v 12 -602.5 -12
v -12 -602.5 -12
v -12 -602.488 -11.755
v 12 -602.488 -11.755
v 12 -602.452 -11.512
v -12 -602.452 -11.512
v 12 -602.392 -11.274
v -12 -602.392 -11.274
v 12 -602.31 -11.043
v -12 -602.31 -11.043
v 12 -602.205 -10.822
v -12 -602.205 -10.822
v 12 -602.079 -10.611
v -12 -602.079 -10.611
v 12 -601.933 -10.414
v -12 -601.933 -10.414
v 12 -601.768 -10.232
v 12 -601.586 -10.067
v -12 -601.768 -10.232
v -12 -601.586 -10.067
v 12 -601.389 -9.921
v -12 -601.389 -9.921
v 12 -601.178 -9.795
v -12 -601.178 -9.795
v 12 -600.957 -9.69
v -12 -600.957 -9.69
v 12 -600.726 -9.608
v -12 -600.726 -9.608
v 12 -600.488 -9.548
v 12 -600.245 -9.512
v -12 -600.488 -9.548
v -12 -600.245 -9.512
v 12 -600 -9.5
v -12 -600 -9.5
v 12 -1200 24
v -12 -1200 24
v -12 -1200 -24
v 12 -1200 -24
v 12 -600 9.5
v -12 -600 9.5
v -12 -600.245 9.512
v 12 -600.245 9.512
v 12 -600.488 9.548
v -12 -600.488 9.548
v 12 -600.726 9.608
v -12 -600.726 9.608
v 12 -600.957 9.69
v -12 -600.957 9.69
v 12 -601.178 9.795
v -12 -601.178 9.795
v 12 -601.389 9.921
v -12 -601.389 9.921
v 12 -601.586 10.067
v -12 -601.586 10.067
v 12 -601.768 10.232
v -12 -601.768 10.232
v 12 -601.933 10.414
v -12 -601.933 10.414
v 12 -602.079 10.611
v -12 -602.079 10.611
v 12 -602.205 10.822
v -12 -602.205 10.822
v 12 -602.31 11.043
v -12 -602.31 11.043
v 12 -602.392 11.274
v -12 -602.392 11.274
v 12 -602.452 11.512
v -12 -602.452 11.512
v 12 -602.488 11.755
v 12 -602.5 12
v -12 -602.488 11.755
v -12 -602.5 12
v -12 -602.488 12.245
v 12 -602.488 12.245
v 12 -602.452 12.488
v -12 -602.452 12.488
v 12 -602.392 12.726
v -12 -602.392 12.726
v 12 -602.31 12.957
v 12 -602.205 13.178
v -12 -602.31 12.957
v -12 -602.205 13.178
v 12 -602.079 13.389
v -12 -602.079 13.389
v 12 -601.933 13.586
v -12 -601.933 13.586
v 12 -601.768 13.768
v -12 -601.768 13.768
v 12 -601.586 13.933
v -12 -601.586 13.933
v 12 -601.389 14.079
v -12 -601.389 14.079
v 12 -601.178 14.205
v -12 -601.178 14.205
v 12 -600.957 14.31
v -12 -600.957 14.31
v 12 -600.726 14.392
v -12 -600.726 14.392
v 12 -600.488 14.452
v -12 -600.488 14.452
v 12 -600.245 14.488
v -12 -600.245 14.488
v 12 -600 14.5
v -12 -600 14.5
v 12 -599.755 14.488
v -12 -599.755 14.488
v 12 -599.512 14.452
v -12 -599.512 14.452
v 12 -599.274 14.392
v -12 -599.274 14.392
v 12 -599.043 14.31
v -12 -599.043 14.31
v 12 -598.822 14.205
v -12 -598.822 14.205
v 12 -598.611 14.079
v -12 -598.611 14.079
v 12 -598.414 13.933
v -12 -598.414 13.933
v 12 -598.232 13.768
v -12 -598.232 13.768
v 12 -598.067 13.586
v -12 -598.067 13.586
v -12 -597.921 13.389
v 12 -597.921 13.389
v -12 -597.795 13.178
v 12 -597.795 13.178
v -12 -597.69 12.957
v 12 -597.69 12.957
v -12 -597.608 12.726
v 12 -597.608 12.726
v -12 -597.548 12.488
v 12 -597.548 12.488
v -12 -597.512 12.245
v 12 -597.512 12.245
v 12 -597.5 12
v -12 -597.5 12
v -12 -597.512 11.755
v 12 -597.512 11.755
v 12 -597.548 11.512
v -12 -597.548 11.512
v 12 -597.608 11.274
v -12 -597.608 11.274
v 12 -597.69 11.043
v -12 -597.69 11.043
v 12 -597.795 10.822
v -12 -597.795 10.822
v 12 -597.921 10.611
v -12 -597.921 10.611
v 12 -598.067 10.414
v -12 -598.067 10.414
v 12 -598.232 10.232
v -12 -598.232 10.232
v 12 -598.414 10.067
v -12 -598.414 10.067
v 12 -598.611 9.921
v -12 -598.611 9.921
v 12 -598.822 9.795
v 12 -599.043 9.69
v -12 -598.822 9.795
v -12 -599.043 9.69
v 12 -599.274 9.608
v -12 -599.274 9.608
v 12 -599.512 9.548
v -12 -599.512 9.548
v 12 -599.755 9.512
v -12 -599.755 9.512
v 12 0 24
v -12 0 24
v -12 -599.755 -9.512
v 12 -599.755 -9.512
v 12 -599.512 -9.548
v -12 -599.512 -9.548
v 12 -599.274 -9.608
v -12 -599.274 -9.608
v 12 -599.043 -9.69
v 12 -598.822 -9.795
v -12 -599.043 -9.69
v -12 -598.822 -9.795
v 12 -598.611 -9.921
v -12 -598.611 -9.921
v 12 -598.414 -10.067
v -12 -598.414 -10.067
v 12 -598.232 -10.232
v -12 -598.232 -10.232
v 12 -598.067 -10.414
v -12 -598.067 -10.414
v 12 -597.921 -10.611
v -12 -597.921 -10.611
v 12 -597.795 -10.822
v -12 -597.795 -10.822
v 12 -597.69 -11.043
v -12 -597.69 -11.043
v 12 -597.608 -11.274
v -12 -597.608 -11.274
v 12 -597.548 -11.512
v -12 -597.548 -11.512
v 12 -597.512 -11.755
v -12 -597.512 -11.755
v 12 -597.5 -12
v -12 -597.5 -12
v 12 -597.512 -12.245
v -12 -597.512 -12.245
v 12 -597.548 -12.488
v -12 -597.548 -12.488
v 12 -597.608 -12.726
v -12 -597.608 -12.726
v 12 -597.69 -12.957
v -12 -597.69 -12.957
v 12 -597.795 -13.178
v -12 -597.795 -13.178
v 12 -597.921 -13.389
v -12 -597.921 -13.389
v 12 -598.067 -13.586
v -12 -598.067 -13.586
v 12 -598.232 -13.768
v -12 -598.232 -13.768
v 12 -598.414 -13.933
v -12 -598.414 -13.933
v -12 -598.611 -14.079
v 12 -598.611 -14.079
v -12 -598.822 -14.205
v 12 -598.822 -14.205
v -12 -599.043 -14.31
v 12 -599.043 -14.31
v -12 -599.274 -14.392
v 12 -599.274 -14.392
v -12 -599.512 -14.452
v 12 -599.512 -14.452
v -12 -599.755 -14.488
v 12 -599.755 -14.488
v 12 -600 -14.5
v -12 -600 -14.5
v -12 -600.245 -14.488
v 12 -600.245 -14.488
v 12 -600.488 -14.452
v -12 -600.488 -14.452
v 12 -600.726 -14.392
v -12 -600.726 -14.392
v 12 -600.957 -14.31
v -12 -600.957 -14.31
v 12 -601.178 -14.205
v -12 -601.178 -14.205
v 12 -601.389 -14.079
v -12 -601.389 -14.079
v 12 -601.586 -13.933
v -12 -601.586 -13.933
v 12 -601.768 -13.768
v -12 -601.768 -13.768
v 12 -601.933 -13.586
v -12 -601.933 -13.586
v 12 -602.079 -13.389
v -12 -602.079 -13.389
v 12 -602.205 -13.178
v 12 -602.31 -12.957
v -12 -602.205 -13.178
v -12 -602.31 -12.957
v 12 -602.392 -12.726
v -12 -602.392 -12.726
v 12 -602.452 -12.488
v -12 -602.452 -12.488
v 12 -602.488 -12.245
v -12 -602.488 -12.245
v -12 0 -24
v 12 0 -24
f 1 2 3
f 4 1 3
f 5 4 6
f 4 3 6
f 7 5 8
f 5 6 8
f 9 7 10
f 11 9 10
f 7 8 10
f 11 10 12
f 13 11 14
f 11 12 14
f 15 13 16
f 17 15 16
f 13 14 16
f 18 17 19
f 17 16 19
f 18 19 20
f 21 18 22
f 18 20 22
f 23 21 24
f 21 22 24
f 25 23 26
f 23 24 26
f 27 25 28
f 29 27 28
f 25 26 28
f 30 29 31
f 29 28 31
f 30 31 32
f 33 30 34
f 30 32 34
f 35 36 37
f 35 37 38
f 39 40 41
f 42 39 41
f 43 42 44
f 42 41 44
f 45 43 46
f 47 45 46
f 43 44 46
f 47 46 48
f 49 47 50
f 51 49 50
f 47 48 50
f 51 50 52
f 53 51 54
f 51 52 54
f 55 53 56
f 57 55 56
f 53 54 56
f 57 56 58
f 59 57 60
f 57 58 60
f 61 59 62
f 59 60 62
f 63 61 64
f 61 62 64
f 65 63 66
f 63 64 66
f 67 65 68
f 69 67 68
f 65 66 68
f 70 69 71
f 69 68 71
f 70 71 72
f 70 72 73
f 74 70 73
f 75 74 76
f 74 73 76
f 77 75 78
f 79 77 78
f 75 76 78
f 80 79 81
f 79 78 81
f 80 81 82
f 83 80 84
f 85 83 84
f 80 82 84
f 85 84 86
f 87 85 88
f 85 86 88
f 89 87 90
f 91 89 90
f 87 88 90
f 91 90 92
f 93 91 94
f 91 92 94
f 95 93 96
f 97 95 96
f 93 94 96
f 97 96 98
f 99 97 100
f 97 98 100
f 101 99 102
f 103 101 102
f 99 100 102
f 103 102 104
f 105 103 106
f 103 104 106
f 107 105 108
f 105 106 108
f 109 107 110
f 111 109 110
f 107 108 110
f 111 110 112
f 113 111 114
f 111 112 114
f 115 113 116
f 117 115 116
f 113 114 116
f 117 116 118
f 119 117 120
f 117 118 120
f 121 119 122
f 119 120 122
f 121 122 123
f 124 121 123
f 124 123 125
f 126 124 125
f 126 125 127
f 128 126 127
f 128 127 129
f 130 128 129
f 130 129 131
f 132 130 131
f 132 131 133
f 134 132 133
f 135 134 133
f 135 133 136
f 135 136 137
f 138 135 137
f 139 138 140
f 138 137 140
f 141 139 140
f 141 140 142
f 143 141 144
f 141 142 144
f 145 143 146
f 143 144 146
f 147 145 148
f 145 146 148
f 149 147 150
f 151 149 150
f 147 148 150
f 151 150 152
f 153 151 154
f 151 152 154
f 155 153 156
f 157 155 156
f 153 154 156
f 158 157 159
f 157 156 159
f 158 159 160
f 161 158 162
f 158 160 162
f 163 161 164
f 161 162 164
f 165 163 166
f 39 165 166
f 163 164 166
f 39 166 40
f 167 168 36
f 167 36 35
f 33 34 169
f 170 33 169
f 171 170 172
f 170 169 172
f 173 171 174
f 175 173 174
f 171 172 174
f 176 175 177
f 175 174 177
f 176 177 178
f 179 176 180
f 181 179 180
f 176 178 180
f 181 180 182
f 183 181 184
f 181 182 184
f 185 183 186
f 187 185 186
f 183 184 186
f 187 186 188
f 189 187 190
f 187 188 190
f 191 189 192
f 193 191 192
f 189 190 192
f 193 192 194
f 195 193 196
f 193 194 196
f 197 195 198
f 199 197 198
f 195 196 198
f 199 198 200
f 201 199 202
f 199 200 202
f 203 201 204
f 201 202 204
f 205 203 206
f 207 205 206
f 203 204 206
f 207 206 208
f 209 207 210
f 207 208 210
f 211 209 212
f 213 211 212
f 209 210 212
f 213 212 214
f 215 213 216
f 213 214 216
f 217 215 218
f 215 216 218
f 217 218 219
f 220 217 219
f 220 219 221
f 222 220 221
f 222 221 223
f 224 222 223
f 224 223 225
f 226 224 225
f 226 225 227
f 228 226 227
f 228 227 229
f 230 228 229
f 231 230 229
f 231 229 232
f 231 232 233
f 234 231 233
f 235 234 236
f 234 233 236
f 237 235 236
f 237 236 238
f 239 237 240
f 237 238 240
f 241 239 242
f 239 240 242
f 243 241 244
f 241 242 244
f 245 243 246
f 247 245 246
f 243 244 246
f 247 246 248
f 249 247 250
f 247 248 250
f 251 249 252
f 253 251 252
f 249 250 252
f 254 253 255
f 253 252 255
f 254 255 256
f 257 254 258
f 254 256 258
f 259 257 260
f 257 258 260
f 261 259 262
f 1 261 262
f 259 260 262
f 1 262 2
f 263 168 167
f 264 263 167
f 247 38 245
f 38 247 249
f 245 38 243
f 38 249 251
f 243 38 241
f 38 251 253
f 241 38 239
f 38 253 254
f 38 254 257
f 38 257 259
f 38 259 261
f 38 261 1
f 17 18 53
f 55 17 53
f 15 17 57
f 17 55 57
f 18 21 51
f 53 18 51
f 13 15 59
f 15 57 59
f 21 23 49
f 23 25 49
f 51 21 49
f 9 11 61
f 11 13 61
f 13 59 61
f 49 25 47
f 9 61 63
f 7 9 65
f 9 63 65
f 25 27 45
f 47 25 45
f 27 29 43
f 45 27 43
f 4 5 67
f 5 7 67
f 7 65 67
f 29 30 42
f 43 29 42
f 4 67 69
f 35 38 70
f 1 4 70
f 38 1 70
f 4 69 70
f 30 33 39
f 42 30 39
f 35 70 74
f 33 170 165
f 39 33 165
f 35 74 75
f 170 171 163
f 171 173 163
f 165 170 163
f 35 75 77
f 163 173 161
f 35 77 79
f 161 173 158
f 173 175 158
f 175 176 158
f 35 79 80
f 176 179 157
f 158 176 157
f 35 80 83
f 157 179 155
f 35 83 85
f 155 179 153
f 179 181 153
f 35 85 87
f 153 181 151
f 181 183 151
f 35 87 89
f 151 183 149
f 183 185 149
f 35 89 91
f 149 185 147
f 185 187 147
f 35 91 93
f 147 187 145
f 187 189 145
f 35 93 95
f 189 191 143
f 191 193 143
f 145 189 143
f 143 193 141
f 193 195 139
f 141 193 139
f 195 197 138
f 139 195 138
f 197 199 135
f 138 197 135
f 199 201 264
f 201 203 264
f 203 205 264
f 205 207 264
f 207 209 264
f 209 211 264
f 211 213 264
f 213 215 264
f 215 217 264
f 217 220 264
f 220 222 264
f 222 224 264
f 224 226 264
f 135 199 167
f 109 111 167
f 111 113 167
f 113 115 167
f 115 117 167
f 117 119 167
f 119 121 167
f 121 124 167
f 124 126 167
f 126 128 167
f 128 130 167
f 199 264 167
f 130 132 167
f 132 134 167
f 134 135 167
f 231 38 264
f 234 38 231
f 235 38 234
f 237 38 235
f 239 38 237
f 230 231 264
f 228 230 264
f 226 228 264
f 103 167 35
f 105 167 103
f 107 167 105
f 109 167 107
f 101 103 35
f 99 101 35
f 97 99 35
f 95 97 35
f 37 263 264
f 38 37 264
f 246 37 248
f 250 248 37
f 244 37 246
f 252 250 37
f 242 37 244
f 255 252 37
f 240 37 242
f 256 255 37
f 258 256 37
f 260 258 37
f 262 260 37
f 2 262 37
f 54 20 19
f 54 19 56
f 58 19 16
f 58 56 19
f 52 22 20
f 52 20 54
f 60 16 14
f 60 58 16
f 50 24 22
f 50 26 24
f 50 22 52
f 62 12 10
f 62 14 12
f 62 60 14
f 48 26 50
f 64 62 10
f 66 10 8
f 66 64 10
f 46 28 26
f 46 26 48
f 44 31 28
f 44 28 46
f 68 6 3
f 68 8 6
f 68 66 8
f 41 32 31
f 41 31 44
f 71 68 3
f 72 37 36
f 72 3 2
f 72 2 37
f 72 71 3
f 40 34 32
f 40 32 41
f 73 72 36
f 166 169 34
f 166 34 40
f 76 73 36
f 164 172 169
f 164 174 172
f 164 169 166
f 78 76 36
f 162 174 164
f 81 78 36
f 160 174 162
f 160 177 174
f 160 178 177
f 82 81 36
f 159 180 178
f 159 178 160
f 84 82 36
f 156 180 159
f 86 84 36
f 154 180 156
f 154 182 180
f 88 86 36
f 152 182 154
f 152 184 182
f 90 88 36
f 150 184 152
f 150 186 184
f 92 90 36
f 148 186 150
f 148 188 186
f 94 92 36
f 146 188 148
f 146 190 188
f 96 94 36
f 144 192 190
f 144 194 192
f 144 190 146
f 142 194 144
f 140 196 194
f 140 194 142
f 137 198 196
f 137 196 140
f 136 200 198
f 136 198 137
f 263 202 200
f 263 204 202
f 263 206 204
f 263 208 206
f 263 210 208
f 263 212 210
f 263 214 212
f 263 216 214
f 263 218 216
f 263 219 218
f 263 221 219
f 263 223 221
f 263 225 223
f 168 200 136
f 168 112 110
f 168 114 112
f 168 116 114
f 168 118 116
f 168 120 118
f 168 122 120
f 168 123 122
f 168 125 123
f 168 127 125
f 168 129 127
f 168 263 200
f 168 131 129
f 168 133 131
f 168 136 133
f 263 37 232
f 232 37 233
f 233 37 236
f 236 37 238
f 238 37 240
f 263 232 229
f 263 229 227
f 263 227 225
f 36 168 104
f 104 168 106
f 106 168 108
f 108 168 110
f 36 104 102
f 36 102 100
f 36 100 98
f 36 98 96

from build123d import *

# Parameters (mm, degrees)
F2_W     = 24
F2_H     = 48
F3_DEPTH = 1200
F5_DEPTH = 24


with BuildPart() as f3:
    # F2 (on Front) → F3 (new body)
    with BuildSketch(Plane.XZ):
        Rectangle(F2_W, F2_H)
    extrude(amount=F3_DEPTH)

    # F4 (on face) → F5 (cut)
    with BuildSketch(Plane(origin=(-12, 0, 0), x_dir=(0, -1, 0), z_dir=(-1, 0, 0))):
        with BuildLine():
            ThreePointArc((1402.5, 12), (1398.232233047, 13.767766953), (1400, 9.5))
            ThreePointArc((1400, 9.5), (1401.767766953, 10.232233047), (1402.5, 12))
        make_face()
        with BuildLine():
            ThreePointArc((1402.5, -12), (1401.767766953, -10.232233047), (1400, -9.5))
            ThreePointArc((1400, -9.5), (1398.232233047, -13.767766953), (1402.5, -12))
        make_face()
        with BuildLine():
            ThreePointArc((602.5, -12), (601.767766953, -10.232233047), (600, -9.5))
            ThreePointArc((600, -9.5), (598.232233047, -13.767766953), (602.5, -12))
        make_face()
        with BuildLine():
            ThreePointArc((602.5, 12), (598.232233047, 13.767766953), (600, 9.5))
            ThreePointArc((600, 9.5), (601.767766953, 10.232233047), (602.5, 12))
        make_face()
    extrude(amount=-F5_DEPTH, mode=Mode.SUBTRACT)


solid = f3.part
